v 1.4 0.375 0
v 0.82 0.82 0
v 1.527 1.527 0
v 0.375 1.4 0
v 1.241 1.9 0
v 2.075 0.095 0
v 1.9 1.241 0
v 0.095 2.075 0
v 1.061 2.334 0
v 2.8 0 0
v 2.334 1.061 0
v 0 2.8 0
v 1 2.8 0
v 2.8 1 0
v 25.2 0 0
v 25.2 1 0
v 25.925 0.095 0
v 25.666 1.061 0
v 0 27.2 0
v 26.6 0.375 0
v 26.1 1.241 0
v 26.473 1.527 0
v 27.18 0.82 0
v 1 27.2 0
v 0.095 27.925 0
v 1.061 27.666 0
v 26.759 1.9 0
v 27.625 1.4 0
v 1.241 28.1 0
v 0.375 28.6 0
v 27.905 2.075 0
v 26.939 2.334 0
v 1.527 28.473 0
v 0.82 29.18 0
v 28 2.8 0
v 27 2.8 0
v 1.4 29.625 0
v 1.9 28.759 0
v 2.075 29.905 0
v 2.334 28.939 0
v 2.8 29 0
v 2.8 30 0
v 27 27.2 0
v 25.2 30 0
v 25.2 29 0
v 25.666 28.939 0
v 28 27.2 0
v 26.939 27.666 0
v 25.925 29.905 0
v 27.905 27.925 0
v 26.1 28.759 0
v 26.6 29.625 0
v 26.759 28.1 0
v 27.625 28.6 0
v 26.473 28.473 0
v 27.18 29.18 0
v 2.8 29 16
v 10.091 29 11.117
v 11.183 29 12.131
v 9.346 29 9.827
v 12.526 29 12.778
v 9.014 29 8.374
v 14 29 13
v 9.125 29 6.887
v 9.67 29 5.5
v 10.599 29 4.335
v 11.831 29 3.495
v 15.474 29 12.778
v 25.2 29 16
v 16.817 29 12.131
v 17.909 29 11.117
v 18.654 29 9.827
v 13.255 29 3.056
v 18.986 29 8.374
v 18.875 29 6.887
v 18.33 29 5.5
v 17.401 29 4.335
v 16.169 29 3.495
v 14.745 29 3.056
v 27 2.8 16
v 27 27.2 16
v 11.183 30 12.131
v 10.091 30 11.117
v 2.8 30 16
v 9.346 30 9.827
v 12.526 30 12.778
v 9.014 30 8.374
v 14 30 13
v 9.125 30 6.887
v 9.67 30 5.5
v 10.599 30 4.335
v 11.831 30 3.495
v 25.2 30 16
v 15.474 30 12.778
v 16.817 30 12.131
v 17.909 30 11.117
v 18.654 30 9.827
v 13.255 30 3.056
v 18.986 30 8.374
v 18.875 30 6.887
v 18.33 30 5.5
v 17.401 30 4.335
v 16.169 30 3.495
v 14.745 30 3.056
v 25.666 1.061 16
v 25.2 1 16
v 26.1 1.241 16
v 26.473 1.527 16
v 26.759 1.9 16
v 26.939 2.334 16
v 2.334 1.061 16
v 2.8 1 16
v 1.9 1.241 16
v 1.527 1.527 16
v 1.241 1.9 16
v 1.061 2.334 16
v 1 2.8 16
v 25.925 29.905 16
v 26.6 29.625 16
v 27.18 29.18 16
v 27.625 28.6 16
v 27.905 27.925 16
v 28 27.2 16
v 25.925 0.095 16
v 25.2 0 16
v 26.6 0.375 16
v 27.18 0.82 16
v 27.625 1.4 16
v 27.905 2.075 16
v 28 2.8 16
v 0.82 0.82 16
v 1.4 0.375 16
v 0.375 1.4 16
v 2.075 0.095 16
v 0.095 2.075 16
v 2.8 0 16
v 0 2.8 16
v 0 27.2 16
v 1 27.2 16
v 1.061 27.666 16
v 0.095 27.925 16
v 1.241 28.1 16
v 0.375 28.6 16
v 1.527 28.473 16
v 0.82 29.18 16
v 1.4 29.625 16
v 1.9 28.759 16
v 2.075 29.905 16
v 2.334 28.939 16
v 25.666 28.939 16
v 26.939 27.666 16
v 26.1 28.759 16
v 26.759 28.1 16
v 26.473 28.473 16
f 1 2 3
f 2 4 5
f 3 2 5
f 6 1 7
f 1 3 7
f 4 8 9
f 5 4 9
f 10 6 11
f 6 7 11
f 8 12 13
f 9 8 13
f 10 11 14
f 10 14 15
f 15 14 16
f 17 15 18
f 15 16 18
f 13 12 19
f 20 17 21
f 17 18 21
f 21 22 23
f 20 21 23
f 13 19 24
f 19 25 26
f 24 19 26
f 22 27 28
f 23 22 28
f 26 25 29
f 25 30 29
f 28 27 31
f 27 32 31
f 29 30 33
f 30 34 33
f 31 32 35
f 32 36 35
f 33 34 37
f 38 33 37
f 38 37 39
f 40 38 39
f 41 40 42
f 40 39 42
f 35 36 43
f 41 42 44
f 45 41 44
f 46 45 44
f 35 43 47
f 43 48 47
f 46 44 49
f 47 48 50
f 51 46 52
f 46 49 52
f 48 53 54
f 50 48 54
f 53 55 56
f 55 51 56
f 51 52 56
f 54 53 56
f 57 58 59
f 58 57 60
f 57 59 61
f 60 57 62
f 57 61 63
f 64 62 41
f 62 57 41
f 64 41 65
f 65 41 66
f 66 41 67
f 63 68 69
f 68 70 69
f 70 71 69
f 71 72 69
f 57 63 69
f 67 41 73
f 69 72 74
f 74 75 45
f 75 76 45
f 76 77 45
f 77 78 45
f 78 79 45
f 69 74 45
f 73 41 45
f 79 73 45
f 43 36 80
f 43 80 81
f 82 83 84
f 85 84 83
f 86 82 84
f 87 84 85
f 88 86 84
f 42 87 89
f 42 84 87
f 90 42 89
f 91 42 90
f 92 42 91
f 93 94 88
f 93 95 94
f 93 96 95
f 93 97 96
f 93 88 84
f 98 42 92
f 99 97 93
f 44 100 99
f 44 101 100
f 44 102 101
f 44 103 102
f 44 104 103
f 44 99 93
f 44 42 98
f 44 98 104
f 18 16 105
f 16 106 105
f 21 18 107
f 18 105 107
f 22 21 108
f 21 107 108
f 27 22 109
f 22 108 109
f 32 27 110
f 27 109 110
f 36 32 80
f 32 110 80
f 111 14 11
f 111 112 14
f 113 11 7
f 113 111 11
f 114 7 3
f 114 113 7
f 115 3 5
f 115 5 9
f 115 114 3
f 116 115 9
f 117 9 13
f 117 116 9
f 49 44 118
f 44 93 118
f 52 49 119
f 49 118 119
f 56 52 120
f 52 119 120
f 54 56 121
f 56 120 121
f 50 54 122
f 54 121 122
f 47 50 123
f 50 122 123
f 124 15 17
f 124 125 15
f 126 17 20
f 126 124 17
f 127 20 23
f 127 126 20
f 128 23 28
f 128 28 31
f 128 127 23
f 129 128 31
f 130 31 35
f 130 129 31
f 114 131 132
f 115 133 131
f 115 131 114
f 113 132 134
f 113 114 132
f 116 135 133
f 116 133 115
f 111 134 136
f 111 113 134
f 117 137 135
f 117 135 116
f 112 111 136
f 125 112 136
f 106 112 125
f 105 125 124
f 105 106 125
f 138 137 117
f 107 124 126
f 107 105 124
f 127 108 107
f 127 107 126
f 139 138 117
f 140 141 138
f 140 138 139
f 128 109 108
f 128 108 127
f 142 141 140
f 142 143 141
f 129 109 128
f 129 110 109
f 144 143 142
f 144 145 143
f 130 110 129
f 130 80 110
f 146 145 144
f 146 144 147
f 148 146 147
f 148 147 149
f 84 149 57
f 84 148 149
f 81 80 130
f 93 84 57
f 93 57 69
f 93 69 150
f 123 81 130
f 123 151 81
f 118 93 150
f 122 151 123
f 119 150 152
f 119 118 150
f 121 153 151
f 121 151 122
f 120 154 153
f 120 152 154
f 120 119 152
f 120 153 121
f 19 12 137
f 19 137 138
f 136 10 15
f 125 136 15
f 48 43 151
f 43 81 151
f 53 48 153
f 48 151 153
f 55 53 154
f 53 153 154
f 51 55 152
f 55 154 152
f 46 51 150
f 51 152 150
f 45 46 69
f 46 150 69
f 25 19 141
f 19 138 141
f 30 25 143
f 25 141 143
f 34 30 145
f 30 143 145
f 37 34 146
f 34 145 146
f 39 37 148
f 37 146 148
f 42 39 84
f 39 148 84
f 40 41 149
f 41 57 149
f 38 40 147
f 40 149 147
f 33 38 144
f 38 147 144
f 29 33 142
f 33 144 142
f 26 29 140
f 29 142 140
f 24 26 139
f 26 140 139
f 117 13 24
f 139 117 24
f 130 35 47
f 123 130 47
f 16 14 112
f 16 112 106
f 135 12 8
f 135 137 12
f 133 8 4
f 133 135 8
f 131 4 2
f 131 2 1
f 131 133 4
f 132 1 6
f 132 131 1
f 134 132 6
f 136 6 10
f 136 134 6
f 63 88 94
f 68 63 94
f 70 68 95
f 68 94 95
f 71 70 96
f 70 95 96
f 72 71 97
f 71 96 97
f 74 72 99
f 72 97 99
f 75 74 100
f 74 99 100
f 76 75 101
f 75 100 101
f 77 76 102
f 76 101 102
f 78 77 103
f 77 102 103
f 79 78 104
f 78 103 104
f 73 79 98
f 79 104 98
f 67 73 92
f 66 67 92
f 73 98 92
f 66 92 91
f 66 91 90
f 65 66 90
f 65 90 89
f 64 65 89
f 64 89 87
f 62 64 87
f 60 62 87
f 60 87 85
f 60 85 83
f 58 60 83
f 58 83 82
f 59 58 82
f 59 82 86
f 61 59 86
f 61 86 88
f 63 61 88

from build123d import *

# Parameters (mm, degrees)
SKETCH_1_W          = 28
SKETCH_1_H          = 30
SKETCH_1_W_2        = 26
SKETCH_1_H_2        = 28
EXTRUDE_1_DEPTH     = 16
FILLET_1_R          = 1.8
FILLET_2_R          = 2.8
SKETCH_2_R          = 5
CUT_EXTRUDE_1_DEPTH = 16


with BuildPart() as part:
    # Эскиз1 → Бобышка-Вытянуть1 (new body)
    with BuildSketch(Plane.XY):
        with Locations((14, 15)):
            Rectangle(SKETCH_1_W, SKETCH_1_H)
        with Locations((14, 15)):
            Rectangle(SKETCH_1_W_2, SKETCH_1_H_2, mode=Mode.SUBTRACT)
    extrude(amount=EXTRUDE_1_DEPTH)

    # Скругление1
    fillet_1_edges = [part.edges().sort_by_distance(p)[0] for p in [
        (27, 29, 8),
        (1, 29, 8),
        (1, 1, 8),
        (27, 1, 8),
    ]]
    fillet(fillet_1_edges, radius=FILLET_1_R)

    # Скругление2
    fillet_2_edges = [part.edges().sort_by_distance(p)[0] for p in [
        (0, 30, 8),
        (28, 30, 8),
        (28, 0, 8),
        (0, 0, 8),
    ]]
    fillet(fillet_2_edges, radius=FILLET_2_R)

    # Эскиз2 → Вырез-Вытянуть1 (cut)
    with BuildSketch(Plane(origin=(0, 30, 0), x_dir=(1, 0, 0), z_dir=(0, 1, 0))):
        with Locations(Location((14, -8, 0), (0, 0, 270))):
            Circle(SKETCH_2_R)
    extrude(amount=-CUT_EXTRUDE_1_DEPTH, mode=Mode.SUBTRACT)


solid = part.part
